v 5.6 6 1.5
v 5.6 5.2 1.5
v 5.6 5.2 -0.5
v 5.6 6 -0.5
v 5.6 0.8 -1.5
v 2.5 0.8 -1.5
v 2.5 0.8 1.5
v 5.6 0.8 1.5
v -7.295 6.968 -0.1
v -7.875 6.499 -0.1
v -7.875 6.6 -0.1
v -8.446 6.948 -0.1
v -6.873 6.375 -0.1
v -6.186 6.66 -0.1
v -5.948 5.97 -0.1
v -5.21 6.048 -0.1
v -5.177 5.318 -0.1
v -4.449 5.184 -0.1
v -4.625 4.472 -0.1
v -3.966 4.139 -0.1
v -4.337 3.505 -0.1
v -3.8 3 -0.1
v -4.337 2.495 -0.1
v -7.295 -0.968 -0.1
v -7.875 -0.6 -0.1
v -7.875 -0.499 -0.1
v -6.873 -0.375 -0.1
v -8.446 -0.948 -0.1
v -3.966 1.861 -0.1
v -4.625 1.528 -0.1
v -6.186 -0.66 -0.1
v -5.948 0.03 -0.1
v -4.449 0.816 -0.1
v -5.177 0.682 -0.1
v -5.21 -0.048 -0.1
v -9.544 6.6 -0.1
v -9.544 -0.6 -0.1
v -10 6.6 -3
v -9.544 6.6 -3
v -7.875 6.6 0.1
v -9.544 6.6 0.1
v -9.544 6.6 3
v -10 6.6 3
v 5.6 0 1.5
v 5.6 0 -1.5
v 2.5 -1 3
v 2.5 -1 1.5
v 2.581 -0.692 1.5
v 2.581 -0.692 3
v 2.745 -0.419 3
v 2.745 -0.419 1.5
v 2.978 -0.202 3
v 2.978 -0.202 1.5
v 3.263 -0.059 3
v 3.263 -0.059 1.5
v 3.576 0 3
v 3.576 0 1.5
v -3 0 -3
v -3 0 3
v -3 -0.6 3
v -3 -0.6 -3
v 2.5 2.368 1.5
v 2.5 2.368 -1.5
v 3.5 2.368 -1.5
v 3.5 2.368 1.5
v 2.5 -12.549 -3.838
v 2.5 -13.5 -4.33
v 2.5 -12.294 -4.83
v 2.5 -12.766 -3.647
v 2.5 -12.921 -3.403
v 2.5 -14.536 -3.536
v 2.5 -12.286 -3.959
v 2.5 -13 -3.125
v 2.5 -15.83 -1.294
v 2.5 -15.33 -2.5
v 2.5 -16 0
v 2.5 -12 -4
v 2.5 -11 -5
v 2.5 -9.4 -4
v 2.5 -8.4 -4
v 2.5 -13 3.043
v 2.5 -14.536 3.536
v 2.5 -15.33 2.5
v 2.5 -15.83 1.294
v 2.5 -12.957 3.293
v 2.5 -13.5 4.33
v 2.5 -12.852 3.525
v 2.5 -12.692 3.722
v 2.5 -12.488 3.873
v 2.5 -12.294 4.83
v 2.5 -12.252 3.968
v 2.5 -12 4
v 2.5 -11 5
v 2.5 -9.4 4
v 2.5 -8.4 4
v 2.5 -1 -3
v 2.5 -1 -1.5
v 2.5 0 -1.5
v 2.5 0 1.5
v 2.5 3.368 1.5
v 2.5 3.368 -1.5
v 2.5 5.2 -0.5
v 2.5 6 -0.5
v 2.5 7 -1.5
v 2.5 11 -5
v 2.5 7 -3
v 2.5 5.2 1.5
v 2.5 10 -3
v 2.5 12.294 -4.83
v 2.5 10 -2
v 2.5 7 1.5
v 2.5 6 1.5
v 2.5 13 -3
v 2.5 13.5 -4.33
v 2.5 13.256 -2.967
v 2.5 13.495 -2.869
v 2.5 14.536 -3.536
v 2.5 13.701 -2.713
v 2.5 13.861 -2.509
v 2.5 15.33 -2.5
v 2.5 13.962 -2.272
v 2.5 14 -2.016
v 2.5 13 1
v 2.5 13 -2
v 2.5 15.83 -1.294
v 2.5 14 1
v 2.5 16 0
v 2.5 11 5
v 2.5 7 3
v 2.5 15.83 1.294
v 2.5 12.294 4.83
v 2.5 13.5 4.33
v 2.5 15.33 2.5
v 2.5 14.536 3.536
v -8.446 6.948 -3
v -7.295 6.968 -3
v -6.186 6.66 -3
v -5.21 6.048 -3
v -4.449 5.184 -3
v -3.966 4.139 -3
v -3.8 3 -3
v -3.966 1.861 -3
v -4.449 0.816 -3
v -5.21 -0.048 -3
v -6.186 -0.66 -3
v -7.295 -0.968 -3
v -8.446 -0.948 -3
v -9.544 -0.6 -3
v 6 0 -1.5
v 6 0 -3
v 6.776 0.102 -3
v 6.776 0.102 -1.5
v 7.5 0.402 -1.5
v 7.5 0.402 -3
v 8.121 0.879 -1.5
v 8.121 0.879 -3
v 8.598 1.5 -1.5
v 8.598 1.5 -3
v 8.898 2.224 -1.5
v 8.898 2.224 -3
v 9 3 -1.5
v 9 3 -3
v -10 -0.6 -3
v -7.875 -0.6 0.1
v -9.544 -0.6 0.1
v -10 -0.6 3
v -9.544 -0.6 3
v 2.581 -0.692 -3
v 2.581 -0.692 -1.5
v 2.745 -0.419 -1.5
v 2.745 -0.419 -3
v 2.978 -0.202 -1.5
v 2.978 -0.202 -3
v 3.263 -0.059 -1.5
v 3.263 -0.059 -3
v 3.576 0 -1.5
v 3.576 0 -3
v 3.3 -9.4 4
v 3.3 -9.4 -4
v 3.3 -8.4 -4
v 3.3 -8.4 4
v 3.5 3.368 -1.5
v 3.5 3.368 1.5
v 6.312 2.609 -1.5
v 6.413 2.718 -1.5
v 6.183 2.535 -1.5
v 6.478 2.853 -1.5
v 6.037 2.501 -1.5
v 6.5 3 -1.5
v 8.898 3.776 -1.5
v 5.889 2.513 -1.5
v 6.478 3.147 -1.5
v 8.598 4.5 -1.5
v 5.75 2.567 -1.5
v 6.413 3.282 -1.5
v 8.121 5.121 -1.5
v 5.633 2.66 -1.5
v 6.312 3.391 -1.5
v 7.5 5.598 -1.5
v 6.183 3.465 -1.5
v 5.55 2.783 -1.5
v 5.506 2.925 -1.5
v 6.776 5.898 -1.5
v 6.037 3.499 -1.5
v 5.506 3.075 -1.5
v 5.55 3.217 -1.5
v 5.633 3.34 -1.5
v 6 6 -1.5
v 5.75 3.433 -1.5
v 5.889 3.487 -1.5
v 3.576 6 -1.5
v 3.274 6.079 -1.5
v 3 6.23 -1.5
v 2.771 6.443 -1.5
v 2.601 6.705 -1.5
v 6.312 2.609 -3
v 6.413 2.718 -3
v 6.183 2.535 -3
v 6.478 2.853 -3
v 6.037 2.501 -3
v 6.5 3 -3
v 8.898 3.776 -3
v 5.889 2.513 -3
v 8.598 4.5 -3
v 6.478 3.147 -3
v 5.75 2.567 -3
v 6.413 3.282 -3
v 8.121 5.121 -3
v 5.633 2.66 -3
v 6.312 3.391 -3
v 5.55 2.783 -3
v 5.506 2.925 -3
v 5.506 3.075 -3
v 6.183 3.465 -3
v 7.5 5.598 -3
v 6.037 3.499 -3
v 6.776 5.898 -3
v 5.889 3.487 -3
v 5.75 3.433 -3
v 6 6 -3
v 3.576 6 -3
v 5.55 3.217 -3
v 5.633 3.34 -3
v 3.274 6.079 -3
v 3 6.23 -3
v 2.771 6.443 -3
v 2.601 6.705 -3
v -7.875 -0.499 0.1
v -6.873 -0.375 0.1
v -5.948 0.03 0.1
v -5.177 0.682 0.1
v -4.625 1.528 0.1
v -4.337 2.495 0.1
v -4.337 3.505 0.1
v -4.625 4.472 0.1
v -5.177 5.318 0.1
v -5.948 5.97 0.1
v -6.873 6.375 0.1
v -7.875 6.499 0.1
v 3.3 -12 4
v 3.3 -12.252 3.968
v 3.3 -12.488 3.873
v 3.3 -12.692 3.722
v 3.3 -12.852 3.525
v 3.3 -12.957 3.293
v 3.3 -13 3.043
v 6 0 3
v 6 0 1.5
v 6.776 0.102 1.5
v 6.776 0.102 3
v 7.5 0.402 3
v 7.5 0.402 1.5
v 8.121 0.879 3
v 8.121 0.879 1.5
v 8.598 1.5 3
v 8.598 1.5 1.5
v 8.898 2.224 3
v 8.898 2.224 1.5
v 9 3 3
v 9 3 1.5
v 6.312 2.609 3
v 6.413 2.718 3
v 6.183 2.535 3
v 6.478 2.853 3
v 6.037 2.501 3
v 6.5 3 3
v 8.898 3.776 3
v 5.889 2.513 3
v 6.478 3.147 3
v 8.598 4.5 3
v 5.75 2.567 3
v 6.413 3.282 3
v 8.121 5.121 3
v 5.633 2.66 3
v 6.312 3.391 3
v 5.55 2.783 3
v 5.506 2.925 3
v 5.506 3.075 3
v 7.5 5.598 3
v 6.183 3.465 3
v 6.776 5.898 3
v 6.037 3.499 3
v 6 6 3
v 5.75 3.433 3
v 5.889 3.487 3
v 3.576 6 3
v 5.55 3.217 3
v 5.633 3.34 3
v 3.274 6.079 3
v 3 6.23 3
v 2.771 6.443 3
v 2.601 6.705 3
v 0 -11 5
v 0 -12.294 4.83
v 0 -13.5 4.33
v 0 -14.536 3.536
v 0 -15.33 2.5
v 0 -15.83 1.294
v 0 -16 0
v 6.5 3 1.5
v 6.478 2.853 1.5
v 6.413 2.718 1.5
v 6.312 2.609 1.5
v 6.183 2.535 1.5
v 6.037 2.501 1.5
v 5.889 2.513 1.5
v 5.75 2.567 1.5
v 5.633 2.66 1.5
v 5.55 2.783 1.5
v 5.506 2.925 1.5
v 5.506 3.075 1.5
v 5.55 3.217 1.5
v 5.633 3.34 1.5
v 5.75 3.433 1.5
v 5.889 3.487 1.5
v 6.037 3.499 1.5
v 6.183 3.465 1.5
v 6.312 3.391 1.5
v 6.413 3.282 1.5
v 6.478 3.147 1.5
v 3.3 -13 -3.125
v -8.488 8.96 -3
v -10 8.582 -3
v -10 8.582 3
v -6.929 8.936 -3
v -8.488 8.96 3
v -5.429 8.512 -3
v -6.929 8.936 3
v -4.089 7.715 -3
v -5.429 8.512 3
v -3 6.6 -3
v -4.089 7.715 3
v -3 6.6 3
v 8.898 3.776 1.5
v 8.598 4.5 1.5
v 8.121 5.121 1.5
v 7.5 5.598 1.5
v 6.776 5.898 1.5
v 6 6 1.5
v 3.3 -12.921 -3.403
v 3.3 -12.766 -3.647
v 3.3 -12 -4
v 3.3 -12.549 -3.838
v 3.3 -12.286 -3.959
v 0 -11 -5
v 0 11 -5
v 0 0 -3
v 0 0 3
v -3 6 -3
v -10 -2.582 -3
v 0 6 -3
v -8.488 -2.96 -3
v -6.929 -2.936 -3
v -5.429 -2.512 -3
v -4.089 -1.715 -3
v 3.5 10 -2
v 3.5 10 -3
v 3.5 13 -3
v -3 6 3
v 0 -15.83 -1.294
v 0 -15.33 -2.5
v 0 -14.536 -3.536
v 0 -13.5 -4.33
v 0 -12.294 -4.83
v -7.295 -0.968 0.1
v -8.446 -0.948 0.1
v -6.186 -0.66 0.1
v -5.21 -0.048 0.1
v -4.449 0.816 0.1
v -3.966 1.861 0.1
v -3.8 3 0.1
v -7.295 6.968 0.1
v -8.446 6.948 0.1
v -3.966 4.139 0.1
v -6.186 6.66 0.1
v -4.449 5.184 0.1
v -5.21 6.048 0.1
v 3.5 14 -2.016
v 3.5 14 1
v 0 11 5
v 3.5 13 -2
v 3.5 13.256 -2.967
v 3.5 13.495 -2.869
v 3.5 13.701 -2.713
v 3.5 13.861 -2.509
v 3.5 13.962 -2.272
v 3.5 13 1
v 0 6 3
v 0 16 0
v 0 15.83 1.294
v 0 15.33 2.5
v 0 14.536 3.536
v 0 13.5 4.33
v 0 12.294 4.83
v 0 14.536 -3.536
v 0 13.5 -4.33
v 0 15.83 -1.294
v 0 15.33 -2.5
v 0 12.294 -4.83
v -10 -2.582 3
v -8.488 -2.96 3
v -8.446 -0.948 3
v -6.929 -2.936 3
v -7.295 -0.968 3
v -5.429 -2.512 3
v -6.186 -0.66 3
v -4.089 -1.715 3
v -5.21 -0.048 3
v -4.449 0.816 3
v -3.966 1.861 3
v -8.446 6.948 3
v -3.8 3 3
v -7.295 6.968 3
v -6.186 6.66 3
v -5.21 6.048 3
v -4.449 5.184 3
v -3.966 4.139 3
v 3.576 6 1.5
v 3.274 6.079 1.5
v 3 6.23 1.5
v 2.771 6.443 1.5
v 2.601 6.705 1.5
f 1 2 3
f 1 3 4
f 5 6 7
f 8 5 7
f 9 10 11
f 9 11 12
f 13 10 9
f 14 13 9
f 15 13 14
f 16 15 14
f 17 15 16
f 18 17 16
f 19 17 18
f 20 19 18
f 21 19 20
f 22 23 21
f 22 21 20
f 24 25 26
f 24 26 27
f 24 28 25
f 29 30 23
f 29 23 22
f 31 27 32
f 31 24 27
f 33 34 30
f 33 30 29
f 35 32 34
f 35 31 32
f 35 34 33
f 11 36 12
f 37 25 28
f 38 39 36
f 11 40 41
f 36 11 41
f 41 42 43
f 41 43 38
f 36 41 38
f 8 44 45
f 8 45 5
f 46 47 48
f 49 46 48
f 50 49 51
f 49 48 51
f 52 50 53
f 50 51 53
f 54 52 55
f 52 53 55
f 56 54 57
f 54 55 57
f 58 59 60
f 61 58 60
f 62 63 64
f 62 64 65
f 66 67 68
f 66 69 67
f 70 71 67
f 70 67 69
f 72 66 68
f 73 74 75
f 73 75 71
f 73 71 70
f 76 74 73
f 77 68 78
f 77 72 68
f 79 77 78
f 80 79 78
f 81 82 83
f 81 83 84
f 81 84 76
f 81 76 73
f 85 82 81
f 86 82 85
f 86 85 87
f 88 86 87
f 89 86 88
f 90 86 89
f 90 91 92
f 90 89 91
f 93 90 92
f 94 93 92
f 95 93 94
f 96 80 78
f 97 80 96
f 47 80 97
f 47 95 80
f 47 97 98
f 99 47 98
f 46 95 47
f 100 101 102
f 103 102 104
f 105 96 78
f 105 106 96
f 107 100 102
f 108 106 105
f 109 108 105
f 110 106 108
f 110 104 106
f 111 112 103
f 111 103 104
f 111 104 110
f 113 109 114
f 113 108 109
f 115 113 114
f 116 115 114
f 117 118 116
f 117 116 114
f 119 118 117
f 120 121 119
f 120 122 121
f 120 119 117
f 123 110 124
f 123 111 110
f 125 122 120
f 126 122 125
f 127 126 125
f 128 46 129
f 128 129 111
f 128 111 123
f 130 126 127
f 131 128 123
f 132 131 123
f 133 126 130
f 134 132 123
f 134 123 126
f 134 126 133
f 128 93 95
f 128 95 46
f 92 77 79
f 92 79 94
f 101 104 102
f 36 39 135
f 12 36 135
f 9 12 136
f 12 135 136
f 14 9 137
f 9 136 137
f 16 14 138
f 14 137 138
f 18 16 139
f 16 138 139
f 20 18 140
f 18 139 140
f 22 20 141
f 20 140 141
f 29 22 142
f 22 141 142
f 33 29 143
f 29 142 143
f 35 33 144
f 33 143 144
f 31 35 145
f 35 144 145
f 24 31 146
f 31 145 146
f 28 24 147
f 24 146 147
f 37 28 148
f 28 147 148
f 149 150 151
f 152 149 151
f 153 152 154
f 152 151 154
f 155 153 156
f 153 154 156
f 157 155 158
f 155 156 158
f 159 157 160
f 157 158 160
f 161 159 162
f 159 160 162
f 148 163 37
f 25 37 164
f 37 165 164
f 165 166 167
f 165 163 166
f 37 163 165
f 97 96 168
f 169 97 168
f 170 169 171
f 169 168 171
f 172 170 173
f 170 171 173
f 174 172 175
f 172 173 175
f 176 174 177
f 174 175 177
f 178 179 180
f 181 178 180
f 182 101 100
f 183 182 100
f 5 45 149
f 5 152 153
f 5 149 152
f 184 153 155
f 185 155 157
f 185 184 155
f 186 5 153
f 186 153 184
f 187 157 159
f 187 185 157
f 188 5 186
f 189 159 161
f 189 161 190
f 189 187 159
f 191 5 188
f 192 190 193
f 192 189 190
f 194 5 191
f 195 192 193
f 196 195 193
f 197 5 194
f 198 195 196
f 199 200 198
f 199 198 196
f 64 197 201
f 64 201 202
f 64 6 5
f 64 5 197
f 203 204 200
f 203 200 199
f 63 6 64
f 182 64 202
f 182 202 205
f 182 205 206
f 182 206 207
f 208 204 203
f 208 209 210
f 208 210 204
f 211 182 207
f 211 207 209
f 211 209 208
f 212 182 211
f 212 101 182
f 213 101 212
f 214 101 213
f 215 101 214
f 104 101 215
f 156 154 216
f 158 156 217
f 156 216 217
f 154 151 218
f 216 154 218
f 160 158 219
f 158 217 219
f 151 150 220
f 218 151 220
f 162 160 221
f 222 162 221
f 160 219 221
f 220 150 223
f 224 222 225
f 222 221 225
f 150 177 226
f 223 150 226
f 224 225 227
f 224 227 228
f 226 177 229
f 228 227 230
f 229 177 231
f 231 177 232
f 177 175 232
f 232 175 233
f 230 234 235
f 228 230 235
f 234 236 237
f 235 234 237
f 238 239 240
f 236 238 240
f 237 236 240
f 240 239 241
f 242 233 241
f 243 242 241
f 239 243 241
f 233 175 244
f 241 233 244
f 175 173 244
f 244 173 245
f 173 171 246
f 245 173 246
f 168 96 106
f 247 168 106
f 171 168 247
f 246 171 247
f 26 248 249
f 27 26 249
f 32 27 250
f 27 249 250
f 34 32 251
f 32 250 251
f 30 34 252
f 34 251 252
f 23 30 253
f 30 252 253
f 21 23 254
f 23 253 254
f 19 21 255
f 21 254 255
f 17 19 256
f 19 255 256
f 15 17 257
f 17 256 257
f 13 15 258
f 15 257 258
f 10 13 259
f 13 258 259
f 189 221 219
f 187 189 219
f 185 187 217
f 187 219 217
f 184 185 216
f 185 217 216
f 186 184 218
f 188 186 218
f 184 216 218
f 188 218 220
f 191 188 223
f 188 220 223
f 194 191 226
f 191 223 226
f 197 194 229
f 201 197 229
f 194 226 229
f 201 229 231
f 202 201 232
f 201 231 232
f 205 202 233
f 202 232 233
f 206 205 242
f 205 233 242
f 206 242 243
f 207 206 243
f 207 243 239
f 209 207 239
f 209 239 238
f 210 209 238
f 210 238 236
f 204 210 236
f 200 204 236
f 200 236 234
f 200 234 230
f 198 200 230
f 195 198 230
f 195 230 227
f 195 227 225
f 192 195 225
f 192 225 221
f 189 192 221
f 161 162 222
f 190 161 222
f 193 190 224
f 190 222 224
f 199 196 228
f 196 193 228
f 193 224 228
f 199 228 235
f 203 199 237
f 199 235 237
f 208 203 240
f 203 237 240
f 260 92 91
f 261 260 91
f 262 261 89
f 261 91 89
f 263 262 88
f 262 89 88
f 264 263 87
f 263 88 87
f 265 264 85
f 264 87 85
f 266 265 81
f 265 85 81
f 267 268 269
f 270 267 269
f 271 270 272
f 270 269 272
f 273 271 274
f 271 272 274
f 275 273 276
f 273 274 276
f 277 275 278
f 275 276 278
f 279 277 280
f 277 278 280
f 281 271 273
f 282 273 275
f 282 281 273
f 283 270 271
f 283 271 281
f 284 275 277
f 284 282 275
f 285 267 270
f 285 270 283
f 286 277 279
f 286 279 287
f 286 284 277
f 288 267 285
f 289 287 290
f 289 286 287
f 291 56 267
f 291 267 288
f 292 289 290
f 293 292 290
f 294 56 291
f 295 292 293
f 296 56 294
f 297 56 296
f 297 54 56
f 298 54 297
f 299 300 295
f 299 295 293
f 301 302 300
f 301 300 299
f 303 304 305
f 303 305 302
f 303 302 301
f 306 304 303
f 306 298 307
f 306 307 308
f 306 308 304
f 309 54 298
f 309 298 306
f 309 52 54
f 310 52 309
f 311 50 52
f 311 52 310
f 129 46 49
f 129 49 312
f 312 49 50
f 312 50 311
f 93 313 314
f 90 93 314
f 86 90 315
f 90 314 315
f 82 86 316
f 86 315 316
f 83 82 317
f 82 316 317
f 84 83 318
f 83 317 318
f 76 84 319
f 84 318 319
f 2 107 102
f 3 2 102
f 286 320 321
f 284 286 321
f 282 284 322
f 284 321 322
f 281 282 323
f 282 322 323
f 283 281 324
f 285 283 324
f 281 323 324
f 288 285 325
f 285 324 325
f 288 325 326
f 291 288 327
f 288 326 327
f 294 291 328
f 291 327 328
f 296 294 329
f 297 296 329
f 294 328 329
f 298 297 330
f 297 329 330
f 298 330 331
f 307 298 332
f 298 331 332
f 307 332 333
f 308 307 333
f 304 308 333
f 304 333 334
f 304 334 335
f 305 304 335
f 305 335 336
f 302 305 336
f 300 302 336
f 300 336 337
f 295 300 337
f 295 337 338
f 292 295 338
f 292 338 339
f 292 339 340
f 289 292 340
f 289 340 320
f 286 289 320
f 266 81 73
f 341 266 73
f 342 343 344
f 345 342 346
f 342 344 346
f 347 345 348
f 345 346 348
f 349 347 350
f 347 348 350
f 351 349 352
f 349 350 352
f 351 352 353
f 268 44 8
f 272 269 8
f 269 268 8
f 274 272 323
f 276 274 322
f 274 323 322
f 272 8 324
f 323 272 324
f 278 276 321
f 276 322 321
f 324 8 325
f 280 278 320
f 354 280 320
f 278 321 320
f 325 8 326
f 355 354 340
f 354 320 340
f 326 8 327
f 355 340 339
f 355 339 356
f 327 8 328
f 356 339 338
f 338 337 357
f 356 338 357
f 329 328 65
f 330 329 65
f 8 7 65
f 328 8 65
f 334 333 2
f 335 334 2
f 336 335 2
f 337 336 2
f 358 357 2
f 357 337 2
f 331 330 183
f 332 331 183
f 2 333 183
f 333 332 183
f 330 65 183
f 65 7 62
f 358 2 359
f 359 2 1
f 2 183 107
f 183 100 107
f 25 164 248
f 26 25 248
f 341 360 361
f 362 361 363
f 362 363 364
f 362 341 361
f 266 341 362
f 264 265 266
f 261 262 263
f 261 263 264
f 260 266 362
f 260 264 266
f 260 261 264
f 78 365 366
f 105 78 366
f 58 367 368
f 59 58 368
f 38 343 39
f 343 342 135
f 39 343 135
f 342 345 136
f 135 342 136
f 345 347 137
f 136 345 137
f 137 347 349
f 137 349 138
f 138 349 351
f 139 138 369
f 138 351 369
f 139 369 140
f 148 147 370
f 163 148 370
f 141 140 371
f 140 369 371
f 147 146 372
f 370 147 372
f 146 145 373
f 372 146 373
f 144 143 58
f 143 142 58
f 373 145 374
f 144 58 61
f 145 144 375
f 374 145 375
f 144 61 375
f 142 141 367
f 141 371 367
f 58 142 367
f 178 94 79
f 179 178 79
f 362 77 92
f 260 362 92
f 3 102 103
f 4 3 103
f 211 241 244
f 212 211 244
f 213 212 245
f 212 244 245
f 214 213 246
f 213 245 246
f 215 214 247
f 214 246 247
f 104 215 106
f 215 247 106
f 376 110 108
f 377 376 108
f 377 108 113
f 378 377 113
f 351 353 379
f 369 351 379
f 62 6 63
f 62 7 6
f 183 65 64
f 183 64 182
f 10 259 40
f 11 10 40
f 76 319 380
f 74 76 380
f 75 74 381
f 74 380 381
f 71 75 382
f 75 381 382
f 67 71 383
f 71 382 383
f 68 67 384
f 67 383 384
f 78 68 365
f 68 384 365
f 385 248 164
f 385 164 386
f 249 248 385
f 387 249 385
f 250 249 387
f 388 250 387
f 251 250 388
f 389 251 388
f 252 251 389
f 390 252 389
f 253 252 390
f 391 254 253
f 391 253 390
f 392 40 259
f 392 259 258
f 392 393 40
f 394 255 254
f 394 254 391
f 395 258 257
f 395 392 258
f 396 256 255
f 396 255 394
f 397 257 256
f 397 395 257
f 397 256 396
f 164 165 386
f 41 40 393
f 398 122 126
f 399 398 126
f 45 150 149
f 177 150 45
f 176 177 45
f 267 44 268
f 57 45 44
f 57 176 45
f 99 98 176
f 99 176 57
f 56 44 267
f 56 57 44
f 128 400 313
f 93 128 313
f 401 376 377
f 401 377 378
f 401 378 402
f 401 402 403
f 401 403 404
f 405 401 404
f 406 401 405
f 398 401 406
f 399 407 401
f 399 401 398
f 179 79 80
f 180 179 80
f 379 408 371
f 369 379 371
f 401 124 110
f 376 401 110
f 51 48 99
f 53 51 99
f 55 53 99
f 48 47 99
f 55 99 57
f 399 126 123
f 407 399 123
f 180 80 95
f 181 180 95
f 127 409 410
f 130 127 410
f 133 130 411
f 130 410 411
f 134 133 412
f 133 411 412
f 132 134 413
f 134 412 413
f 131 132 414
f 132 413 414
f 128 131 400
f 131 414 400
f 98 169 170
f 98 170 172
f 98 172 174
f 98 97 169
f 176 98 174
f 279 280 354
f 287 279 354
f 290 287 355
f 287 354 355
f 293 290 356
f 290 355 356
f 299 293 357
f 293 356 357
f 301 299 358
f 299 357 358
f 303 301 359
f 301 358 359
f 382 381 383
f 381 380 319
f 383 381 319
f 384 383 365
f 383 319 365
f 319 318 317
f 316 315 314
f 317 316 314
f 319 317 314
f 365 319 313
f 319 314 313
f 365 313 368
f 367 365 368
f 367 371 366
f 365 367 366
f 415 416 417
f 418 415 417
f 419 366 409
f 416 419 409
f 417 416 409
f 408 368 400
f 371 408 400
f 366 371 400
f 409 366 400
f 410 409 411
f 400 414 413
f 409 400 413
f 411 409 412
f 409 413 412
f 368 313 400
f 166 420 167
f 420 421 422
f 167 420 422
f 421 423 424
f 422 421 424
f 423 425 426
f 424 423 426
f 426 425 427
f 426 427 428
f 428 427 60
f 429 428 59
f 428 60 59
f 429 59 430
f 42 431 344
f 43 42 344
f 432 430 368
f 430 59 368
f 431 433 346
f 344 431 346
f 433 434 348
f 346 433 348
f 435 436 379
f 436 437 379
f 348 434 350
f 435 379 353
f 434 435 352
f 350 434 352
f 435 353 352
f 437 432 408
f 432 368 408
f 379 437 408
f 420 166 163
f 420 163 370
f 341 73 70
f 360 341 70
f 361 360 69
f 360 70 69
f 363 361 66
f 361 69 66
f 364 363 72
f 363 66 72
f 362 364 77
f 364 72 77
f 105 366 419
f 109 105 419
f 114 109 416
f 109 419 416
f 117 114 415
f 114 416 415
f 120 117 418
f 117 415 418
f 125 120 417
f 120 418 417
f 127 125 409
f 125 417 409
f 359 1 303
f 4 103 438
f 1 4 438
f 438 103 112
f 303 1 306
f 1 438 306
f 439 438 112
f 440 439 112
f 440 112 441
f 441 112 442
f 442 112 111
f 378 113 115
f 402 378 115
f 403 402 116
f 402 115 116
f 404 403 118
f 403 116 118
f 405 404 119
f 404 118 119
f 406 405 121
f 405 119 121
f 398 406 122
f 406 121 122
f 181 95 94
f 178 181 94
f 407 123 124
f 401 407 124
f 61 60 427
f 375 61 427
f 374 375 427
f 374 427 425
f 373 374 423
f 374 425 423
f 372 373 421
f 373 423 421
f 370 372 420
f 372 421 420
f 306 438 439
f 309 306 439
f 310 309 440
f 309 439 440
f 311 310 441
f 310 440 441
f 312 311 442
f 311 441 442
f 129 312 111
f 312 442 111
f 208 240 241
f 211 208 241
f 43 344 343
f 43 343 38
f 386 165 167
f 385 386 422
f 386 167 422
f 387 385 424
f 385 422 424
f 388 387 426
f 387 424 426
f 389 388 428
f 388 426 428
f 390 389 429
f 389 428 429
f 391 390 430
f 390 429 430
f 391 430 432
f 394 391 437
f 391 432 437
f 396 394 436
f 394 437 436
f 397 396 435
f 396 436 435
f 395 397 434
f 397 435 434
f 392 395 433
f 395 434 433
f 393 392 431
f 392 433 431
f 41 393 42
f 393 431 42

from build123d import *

# Parameters (mm, degrees)
F1_DEPTH  = 2.5
F2_W      = 8
F2_H      = 1.5
F3_DEPTH  = 6.5
F4_R      = 0.5
F5_DEPTH  = 25
F6_W      = 0.8
F6_H      = 3
F7_DEPTH  = 3.1
F8_W      = 1
F8_H      = 3
F9_DEPTH  = 1
F11_DEPTH = 0.8
F13_DEPTH = 3
F15_DEPTH = 7
F16_R     = 4
F17_DEPTH = 2.9
F18_R     = 4
F19_DEPTH = 2.9
F20_R     = 3.5
F21_DEPTH = 25
F23_DEPTH = 25


with BuildPart() as f1:
    # F0 (on Right) → F1 (new body)
    with BuildSketch(Plane.YZ):
        with BuildLine():
            Line((11, 5), (-11, 5))
            ThreePointArc((-11, 5), (-14.535534, 3.535534), (-16, 0))
            ThreePointArc((-16, 0), (-14.535534, -3.535534), (-11, -5))
            Line((-11, -5), (11, -5))
            ThreePointArc((11, -5), (14.535534, -3.535534), (16, 0))
            ThreePointArc((16, 0), (14.535534, 3.535534), (11, 5))
        make_face()
    extrude(amount=F1_DEPTH)

    # F2 (on face) → F3 (join)
    with BuildSketch(Plane.YZ.offset(2.5)):
        with Locations((3, 2.25)):
            Rectangle(F2_W, F2_H)
        with Locations((3, -2.25)):
            Rectangle(F2_W, F2_H)
    extrude(amount=F3_DEPTH)

    # F4 (on face) → F5 (cut)
    with BuildSketch(Plane(origin=(0, 0, -3), x_dir=(1, 0, 0), z_dir=(0, 0, -1))):
        with BuildLine():
            Line((9, -6), (9, -3))
            ThreePointArc((9, -3), (8.12132, -5.12132), (6, -6))
            Line((6, -6), (3.575691, -6))
            ThreePointArc((3.575691, -6), (2.879031, -6.329165), (2.5, -7))
            Line((2.5, -7), (9, -7))
            Line((9, -7), (9, -6))
        make_face()
        with BuildLine():
            Line((9, 1), (2.5, 1))
            ThreePointArc((2.5, 1), (2.854094, 0.30234), (3.575691, 0))
            Line((3.575691, 0), (6, 0))
            ThreePointArc((6, 0), (8.12132, -0.87868), (9, -3))
            Line((9, -3), (9, 0))
            Line((9, 0), (9, 1))
        make_face()
        with Locations((6, -3)):
            Circle(F4_R)
    extrude(amount=-F5_DEPTH, mode=Mode.SUBTRACT)

    # F6 (on face) → F7 (join)
    with BuildSketch(Plane.YZ.offset(2.5)):
        with Locations((0.4, 0)):
            Rectangle(F6_W, F6_H)
        Polygon((5.2, 1.5), (5.2, 1.4), (5.2, -0.5), (6, -0.5), (6, 1.5), align=None)
    extrude(amount=F7_DEPTH)

    # F8 (on face) → F9 (join)
    with BuildSketch(Plane.YZ.offset(2.5)):
        with BuildLine():
            Line((13, -1.999869), (13, -2))
            Line((13, -2), (11, -2))
            Line((11, -2), (10, -2))
            Line((10, -2), (10, -3))
            Line((10, -3), (13, -3))
            ThreePointArc((13, -3), (13.701444, -2.712777), (14, -2.016082))
            Line((14, -2.016082), (14, 1))
            Line((14, 1), (13, 1))
            Line((13, 1), (13, 0))
            Line((13, 0), (13, -1.999869))
        make_face()
        with Locations((2.868138, 0)):
            Rectangle(F8_W, F8_H)
    extrude(amount=F9_DEPTH)

    # F10 (on face) → F11 (join)
    with BuildSketch(Plane.YZ.offset(2.5)):
        Polygon((-9.4, -4), (-8.9, -4), (-8.4, -4), (-8.4, 4), (-8.9, 4), (-9.4, 4), align=None)
        with BuildLine():
            Line((-12, -4), (-12, 0))
            Line((-12, 0), (-12, 4))
            ThreePointArc((-12, 4), (-12.692073, 3.722199), (-13, 3.042993))
            Line((-13, 3.042993), (-13, -3.125271))
            ThreePointArc((-13, -3.125271), (-12.664295, -3.750459), (-12, -4))
        make_face()
    extrude(amount=F11_DEPTH)

    # F12 (on face) → F13 (join)
    with BuildSketch(Plane(origin=(0, 0, 0), x_dir=(0, -1, 0), z_dir=(-1, 0, 0))):
        Polygon((-6, 3), (-6, 0), (-6, -3), (0, -3), (0, 3), align=None)
    extrude(amount=F13_DEPTH)

    # F14 (on face) → F15 (join)
    with BuildSketch(Plane(origin=(-3, 0, 0), x_dir=(0, -1, 0), z_dir=(-1, 0, 0))):
        Polygon((-9, -3), (-6, -3), (3, -3), (3, 3), (0, 3), (-9, 3), align=None)
    extrude(amount=F15_DEPTH)

    # F16 (on face) → F17 (cut)
    with BuildSketch(Plane(origin=(0, 0, -3), x_dir=(1, 0, 0), z_dir=(0, 0, -1))):
        with Locations((-7.8, -3)):
            Circle(F16_R)
    extrude(amount=-F17_DEPTH, mode=Mode.SUBTRACT)

    # F18 (on face) → F19 (cut)
    with BuildSketch(Plane.XY.offset(3)):
        with Locations((-7.8, 3)):
            Circle(F18_R)
    extrude(amount=-F19_DEPTH, mode=Mode.SUBTRACT)

    # F20 (on face) → F21 (cut)
    with BuildSketch(Plane.XY.offset(0.1)):
        with Locations((-7.8, 3)):
            Circle(F20_R)
    extrude(amount=-F21_DEPTH, mode=Mode.SUBTRACT)

    # F22 (on face) → F23 (cut)
    with BuildSketch(Plane.XY.offset(3)):
        with BuildLine():
            ThreePointArc((-12.6, 6.6), (-7.8, 9), (-3, 6.6))
            Line((-3, 6.6), (-3, 10.6))
            Line((-3, 10.6), (-18.027099, 10.6))
            Line((-18.027099, 10.6), (-18.027099, -4.6))
            Line((-18.027099, -4.6), (-3, -4.6))
            Line((-3, -4.6), (-3, -0.6))
            ThreePointArc((-3, -0.6), (-7.8, -3), (-12.6, -0.6))
            Line((-12.6, -0.6), (-7.874562, -0.6))
            Line((-7.874562, -0.6), (-7.874562, 6.6))
            Line((-7.874562, 6.6), (-12.6, 6.6))
        make_face()
    extrude(amount=-F23_DEPTH, mode=Mode.SUBTRACT)


solid = f1.part
